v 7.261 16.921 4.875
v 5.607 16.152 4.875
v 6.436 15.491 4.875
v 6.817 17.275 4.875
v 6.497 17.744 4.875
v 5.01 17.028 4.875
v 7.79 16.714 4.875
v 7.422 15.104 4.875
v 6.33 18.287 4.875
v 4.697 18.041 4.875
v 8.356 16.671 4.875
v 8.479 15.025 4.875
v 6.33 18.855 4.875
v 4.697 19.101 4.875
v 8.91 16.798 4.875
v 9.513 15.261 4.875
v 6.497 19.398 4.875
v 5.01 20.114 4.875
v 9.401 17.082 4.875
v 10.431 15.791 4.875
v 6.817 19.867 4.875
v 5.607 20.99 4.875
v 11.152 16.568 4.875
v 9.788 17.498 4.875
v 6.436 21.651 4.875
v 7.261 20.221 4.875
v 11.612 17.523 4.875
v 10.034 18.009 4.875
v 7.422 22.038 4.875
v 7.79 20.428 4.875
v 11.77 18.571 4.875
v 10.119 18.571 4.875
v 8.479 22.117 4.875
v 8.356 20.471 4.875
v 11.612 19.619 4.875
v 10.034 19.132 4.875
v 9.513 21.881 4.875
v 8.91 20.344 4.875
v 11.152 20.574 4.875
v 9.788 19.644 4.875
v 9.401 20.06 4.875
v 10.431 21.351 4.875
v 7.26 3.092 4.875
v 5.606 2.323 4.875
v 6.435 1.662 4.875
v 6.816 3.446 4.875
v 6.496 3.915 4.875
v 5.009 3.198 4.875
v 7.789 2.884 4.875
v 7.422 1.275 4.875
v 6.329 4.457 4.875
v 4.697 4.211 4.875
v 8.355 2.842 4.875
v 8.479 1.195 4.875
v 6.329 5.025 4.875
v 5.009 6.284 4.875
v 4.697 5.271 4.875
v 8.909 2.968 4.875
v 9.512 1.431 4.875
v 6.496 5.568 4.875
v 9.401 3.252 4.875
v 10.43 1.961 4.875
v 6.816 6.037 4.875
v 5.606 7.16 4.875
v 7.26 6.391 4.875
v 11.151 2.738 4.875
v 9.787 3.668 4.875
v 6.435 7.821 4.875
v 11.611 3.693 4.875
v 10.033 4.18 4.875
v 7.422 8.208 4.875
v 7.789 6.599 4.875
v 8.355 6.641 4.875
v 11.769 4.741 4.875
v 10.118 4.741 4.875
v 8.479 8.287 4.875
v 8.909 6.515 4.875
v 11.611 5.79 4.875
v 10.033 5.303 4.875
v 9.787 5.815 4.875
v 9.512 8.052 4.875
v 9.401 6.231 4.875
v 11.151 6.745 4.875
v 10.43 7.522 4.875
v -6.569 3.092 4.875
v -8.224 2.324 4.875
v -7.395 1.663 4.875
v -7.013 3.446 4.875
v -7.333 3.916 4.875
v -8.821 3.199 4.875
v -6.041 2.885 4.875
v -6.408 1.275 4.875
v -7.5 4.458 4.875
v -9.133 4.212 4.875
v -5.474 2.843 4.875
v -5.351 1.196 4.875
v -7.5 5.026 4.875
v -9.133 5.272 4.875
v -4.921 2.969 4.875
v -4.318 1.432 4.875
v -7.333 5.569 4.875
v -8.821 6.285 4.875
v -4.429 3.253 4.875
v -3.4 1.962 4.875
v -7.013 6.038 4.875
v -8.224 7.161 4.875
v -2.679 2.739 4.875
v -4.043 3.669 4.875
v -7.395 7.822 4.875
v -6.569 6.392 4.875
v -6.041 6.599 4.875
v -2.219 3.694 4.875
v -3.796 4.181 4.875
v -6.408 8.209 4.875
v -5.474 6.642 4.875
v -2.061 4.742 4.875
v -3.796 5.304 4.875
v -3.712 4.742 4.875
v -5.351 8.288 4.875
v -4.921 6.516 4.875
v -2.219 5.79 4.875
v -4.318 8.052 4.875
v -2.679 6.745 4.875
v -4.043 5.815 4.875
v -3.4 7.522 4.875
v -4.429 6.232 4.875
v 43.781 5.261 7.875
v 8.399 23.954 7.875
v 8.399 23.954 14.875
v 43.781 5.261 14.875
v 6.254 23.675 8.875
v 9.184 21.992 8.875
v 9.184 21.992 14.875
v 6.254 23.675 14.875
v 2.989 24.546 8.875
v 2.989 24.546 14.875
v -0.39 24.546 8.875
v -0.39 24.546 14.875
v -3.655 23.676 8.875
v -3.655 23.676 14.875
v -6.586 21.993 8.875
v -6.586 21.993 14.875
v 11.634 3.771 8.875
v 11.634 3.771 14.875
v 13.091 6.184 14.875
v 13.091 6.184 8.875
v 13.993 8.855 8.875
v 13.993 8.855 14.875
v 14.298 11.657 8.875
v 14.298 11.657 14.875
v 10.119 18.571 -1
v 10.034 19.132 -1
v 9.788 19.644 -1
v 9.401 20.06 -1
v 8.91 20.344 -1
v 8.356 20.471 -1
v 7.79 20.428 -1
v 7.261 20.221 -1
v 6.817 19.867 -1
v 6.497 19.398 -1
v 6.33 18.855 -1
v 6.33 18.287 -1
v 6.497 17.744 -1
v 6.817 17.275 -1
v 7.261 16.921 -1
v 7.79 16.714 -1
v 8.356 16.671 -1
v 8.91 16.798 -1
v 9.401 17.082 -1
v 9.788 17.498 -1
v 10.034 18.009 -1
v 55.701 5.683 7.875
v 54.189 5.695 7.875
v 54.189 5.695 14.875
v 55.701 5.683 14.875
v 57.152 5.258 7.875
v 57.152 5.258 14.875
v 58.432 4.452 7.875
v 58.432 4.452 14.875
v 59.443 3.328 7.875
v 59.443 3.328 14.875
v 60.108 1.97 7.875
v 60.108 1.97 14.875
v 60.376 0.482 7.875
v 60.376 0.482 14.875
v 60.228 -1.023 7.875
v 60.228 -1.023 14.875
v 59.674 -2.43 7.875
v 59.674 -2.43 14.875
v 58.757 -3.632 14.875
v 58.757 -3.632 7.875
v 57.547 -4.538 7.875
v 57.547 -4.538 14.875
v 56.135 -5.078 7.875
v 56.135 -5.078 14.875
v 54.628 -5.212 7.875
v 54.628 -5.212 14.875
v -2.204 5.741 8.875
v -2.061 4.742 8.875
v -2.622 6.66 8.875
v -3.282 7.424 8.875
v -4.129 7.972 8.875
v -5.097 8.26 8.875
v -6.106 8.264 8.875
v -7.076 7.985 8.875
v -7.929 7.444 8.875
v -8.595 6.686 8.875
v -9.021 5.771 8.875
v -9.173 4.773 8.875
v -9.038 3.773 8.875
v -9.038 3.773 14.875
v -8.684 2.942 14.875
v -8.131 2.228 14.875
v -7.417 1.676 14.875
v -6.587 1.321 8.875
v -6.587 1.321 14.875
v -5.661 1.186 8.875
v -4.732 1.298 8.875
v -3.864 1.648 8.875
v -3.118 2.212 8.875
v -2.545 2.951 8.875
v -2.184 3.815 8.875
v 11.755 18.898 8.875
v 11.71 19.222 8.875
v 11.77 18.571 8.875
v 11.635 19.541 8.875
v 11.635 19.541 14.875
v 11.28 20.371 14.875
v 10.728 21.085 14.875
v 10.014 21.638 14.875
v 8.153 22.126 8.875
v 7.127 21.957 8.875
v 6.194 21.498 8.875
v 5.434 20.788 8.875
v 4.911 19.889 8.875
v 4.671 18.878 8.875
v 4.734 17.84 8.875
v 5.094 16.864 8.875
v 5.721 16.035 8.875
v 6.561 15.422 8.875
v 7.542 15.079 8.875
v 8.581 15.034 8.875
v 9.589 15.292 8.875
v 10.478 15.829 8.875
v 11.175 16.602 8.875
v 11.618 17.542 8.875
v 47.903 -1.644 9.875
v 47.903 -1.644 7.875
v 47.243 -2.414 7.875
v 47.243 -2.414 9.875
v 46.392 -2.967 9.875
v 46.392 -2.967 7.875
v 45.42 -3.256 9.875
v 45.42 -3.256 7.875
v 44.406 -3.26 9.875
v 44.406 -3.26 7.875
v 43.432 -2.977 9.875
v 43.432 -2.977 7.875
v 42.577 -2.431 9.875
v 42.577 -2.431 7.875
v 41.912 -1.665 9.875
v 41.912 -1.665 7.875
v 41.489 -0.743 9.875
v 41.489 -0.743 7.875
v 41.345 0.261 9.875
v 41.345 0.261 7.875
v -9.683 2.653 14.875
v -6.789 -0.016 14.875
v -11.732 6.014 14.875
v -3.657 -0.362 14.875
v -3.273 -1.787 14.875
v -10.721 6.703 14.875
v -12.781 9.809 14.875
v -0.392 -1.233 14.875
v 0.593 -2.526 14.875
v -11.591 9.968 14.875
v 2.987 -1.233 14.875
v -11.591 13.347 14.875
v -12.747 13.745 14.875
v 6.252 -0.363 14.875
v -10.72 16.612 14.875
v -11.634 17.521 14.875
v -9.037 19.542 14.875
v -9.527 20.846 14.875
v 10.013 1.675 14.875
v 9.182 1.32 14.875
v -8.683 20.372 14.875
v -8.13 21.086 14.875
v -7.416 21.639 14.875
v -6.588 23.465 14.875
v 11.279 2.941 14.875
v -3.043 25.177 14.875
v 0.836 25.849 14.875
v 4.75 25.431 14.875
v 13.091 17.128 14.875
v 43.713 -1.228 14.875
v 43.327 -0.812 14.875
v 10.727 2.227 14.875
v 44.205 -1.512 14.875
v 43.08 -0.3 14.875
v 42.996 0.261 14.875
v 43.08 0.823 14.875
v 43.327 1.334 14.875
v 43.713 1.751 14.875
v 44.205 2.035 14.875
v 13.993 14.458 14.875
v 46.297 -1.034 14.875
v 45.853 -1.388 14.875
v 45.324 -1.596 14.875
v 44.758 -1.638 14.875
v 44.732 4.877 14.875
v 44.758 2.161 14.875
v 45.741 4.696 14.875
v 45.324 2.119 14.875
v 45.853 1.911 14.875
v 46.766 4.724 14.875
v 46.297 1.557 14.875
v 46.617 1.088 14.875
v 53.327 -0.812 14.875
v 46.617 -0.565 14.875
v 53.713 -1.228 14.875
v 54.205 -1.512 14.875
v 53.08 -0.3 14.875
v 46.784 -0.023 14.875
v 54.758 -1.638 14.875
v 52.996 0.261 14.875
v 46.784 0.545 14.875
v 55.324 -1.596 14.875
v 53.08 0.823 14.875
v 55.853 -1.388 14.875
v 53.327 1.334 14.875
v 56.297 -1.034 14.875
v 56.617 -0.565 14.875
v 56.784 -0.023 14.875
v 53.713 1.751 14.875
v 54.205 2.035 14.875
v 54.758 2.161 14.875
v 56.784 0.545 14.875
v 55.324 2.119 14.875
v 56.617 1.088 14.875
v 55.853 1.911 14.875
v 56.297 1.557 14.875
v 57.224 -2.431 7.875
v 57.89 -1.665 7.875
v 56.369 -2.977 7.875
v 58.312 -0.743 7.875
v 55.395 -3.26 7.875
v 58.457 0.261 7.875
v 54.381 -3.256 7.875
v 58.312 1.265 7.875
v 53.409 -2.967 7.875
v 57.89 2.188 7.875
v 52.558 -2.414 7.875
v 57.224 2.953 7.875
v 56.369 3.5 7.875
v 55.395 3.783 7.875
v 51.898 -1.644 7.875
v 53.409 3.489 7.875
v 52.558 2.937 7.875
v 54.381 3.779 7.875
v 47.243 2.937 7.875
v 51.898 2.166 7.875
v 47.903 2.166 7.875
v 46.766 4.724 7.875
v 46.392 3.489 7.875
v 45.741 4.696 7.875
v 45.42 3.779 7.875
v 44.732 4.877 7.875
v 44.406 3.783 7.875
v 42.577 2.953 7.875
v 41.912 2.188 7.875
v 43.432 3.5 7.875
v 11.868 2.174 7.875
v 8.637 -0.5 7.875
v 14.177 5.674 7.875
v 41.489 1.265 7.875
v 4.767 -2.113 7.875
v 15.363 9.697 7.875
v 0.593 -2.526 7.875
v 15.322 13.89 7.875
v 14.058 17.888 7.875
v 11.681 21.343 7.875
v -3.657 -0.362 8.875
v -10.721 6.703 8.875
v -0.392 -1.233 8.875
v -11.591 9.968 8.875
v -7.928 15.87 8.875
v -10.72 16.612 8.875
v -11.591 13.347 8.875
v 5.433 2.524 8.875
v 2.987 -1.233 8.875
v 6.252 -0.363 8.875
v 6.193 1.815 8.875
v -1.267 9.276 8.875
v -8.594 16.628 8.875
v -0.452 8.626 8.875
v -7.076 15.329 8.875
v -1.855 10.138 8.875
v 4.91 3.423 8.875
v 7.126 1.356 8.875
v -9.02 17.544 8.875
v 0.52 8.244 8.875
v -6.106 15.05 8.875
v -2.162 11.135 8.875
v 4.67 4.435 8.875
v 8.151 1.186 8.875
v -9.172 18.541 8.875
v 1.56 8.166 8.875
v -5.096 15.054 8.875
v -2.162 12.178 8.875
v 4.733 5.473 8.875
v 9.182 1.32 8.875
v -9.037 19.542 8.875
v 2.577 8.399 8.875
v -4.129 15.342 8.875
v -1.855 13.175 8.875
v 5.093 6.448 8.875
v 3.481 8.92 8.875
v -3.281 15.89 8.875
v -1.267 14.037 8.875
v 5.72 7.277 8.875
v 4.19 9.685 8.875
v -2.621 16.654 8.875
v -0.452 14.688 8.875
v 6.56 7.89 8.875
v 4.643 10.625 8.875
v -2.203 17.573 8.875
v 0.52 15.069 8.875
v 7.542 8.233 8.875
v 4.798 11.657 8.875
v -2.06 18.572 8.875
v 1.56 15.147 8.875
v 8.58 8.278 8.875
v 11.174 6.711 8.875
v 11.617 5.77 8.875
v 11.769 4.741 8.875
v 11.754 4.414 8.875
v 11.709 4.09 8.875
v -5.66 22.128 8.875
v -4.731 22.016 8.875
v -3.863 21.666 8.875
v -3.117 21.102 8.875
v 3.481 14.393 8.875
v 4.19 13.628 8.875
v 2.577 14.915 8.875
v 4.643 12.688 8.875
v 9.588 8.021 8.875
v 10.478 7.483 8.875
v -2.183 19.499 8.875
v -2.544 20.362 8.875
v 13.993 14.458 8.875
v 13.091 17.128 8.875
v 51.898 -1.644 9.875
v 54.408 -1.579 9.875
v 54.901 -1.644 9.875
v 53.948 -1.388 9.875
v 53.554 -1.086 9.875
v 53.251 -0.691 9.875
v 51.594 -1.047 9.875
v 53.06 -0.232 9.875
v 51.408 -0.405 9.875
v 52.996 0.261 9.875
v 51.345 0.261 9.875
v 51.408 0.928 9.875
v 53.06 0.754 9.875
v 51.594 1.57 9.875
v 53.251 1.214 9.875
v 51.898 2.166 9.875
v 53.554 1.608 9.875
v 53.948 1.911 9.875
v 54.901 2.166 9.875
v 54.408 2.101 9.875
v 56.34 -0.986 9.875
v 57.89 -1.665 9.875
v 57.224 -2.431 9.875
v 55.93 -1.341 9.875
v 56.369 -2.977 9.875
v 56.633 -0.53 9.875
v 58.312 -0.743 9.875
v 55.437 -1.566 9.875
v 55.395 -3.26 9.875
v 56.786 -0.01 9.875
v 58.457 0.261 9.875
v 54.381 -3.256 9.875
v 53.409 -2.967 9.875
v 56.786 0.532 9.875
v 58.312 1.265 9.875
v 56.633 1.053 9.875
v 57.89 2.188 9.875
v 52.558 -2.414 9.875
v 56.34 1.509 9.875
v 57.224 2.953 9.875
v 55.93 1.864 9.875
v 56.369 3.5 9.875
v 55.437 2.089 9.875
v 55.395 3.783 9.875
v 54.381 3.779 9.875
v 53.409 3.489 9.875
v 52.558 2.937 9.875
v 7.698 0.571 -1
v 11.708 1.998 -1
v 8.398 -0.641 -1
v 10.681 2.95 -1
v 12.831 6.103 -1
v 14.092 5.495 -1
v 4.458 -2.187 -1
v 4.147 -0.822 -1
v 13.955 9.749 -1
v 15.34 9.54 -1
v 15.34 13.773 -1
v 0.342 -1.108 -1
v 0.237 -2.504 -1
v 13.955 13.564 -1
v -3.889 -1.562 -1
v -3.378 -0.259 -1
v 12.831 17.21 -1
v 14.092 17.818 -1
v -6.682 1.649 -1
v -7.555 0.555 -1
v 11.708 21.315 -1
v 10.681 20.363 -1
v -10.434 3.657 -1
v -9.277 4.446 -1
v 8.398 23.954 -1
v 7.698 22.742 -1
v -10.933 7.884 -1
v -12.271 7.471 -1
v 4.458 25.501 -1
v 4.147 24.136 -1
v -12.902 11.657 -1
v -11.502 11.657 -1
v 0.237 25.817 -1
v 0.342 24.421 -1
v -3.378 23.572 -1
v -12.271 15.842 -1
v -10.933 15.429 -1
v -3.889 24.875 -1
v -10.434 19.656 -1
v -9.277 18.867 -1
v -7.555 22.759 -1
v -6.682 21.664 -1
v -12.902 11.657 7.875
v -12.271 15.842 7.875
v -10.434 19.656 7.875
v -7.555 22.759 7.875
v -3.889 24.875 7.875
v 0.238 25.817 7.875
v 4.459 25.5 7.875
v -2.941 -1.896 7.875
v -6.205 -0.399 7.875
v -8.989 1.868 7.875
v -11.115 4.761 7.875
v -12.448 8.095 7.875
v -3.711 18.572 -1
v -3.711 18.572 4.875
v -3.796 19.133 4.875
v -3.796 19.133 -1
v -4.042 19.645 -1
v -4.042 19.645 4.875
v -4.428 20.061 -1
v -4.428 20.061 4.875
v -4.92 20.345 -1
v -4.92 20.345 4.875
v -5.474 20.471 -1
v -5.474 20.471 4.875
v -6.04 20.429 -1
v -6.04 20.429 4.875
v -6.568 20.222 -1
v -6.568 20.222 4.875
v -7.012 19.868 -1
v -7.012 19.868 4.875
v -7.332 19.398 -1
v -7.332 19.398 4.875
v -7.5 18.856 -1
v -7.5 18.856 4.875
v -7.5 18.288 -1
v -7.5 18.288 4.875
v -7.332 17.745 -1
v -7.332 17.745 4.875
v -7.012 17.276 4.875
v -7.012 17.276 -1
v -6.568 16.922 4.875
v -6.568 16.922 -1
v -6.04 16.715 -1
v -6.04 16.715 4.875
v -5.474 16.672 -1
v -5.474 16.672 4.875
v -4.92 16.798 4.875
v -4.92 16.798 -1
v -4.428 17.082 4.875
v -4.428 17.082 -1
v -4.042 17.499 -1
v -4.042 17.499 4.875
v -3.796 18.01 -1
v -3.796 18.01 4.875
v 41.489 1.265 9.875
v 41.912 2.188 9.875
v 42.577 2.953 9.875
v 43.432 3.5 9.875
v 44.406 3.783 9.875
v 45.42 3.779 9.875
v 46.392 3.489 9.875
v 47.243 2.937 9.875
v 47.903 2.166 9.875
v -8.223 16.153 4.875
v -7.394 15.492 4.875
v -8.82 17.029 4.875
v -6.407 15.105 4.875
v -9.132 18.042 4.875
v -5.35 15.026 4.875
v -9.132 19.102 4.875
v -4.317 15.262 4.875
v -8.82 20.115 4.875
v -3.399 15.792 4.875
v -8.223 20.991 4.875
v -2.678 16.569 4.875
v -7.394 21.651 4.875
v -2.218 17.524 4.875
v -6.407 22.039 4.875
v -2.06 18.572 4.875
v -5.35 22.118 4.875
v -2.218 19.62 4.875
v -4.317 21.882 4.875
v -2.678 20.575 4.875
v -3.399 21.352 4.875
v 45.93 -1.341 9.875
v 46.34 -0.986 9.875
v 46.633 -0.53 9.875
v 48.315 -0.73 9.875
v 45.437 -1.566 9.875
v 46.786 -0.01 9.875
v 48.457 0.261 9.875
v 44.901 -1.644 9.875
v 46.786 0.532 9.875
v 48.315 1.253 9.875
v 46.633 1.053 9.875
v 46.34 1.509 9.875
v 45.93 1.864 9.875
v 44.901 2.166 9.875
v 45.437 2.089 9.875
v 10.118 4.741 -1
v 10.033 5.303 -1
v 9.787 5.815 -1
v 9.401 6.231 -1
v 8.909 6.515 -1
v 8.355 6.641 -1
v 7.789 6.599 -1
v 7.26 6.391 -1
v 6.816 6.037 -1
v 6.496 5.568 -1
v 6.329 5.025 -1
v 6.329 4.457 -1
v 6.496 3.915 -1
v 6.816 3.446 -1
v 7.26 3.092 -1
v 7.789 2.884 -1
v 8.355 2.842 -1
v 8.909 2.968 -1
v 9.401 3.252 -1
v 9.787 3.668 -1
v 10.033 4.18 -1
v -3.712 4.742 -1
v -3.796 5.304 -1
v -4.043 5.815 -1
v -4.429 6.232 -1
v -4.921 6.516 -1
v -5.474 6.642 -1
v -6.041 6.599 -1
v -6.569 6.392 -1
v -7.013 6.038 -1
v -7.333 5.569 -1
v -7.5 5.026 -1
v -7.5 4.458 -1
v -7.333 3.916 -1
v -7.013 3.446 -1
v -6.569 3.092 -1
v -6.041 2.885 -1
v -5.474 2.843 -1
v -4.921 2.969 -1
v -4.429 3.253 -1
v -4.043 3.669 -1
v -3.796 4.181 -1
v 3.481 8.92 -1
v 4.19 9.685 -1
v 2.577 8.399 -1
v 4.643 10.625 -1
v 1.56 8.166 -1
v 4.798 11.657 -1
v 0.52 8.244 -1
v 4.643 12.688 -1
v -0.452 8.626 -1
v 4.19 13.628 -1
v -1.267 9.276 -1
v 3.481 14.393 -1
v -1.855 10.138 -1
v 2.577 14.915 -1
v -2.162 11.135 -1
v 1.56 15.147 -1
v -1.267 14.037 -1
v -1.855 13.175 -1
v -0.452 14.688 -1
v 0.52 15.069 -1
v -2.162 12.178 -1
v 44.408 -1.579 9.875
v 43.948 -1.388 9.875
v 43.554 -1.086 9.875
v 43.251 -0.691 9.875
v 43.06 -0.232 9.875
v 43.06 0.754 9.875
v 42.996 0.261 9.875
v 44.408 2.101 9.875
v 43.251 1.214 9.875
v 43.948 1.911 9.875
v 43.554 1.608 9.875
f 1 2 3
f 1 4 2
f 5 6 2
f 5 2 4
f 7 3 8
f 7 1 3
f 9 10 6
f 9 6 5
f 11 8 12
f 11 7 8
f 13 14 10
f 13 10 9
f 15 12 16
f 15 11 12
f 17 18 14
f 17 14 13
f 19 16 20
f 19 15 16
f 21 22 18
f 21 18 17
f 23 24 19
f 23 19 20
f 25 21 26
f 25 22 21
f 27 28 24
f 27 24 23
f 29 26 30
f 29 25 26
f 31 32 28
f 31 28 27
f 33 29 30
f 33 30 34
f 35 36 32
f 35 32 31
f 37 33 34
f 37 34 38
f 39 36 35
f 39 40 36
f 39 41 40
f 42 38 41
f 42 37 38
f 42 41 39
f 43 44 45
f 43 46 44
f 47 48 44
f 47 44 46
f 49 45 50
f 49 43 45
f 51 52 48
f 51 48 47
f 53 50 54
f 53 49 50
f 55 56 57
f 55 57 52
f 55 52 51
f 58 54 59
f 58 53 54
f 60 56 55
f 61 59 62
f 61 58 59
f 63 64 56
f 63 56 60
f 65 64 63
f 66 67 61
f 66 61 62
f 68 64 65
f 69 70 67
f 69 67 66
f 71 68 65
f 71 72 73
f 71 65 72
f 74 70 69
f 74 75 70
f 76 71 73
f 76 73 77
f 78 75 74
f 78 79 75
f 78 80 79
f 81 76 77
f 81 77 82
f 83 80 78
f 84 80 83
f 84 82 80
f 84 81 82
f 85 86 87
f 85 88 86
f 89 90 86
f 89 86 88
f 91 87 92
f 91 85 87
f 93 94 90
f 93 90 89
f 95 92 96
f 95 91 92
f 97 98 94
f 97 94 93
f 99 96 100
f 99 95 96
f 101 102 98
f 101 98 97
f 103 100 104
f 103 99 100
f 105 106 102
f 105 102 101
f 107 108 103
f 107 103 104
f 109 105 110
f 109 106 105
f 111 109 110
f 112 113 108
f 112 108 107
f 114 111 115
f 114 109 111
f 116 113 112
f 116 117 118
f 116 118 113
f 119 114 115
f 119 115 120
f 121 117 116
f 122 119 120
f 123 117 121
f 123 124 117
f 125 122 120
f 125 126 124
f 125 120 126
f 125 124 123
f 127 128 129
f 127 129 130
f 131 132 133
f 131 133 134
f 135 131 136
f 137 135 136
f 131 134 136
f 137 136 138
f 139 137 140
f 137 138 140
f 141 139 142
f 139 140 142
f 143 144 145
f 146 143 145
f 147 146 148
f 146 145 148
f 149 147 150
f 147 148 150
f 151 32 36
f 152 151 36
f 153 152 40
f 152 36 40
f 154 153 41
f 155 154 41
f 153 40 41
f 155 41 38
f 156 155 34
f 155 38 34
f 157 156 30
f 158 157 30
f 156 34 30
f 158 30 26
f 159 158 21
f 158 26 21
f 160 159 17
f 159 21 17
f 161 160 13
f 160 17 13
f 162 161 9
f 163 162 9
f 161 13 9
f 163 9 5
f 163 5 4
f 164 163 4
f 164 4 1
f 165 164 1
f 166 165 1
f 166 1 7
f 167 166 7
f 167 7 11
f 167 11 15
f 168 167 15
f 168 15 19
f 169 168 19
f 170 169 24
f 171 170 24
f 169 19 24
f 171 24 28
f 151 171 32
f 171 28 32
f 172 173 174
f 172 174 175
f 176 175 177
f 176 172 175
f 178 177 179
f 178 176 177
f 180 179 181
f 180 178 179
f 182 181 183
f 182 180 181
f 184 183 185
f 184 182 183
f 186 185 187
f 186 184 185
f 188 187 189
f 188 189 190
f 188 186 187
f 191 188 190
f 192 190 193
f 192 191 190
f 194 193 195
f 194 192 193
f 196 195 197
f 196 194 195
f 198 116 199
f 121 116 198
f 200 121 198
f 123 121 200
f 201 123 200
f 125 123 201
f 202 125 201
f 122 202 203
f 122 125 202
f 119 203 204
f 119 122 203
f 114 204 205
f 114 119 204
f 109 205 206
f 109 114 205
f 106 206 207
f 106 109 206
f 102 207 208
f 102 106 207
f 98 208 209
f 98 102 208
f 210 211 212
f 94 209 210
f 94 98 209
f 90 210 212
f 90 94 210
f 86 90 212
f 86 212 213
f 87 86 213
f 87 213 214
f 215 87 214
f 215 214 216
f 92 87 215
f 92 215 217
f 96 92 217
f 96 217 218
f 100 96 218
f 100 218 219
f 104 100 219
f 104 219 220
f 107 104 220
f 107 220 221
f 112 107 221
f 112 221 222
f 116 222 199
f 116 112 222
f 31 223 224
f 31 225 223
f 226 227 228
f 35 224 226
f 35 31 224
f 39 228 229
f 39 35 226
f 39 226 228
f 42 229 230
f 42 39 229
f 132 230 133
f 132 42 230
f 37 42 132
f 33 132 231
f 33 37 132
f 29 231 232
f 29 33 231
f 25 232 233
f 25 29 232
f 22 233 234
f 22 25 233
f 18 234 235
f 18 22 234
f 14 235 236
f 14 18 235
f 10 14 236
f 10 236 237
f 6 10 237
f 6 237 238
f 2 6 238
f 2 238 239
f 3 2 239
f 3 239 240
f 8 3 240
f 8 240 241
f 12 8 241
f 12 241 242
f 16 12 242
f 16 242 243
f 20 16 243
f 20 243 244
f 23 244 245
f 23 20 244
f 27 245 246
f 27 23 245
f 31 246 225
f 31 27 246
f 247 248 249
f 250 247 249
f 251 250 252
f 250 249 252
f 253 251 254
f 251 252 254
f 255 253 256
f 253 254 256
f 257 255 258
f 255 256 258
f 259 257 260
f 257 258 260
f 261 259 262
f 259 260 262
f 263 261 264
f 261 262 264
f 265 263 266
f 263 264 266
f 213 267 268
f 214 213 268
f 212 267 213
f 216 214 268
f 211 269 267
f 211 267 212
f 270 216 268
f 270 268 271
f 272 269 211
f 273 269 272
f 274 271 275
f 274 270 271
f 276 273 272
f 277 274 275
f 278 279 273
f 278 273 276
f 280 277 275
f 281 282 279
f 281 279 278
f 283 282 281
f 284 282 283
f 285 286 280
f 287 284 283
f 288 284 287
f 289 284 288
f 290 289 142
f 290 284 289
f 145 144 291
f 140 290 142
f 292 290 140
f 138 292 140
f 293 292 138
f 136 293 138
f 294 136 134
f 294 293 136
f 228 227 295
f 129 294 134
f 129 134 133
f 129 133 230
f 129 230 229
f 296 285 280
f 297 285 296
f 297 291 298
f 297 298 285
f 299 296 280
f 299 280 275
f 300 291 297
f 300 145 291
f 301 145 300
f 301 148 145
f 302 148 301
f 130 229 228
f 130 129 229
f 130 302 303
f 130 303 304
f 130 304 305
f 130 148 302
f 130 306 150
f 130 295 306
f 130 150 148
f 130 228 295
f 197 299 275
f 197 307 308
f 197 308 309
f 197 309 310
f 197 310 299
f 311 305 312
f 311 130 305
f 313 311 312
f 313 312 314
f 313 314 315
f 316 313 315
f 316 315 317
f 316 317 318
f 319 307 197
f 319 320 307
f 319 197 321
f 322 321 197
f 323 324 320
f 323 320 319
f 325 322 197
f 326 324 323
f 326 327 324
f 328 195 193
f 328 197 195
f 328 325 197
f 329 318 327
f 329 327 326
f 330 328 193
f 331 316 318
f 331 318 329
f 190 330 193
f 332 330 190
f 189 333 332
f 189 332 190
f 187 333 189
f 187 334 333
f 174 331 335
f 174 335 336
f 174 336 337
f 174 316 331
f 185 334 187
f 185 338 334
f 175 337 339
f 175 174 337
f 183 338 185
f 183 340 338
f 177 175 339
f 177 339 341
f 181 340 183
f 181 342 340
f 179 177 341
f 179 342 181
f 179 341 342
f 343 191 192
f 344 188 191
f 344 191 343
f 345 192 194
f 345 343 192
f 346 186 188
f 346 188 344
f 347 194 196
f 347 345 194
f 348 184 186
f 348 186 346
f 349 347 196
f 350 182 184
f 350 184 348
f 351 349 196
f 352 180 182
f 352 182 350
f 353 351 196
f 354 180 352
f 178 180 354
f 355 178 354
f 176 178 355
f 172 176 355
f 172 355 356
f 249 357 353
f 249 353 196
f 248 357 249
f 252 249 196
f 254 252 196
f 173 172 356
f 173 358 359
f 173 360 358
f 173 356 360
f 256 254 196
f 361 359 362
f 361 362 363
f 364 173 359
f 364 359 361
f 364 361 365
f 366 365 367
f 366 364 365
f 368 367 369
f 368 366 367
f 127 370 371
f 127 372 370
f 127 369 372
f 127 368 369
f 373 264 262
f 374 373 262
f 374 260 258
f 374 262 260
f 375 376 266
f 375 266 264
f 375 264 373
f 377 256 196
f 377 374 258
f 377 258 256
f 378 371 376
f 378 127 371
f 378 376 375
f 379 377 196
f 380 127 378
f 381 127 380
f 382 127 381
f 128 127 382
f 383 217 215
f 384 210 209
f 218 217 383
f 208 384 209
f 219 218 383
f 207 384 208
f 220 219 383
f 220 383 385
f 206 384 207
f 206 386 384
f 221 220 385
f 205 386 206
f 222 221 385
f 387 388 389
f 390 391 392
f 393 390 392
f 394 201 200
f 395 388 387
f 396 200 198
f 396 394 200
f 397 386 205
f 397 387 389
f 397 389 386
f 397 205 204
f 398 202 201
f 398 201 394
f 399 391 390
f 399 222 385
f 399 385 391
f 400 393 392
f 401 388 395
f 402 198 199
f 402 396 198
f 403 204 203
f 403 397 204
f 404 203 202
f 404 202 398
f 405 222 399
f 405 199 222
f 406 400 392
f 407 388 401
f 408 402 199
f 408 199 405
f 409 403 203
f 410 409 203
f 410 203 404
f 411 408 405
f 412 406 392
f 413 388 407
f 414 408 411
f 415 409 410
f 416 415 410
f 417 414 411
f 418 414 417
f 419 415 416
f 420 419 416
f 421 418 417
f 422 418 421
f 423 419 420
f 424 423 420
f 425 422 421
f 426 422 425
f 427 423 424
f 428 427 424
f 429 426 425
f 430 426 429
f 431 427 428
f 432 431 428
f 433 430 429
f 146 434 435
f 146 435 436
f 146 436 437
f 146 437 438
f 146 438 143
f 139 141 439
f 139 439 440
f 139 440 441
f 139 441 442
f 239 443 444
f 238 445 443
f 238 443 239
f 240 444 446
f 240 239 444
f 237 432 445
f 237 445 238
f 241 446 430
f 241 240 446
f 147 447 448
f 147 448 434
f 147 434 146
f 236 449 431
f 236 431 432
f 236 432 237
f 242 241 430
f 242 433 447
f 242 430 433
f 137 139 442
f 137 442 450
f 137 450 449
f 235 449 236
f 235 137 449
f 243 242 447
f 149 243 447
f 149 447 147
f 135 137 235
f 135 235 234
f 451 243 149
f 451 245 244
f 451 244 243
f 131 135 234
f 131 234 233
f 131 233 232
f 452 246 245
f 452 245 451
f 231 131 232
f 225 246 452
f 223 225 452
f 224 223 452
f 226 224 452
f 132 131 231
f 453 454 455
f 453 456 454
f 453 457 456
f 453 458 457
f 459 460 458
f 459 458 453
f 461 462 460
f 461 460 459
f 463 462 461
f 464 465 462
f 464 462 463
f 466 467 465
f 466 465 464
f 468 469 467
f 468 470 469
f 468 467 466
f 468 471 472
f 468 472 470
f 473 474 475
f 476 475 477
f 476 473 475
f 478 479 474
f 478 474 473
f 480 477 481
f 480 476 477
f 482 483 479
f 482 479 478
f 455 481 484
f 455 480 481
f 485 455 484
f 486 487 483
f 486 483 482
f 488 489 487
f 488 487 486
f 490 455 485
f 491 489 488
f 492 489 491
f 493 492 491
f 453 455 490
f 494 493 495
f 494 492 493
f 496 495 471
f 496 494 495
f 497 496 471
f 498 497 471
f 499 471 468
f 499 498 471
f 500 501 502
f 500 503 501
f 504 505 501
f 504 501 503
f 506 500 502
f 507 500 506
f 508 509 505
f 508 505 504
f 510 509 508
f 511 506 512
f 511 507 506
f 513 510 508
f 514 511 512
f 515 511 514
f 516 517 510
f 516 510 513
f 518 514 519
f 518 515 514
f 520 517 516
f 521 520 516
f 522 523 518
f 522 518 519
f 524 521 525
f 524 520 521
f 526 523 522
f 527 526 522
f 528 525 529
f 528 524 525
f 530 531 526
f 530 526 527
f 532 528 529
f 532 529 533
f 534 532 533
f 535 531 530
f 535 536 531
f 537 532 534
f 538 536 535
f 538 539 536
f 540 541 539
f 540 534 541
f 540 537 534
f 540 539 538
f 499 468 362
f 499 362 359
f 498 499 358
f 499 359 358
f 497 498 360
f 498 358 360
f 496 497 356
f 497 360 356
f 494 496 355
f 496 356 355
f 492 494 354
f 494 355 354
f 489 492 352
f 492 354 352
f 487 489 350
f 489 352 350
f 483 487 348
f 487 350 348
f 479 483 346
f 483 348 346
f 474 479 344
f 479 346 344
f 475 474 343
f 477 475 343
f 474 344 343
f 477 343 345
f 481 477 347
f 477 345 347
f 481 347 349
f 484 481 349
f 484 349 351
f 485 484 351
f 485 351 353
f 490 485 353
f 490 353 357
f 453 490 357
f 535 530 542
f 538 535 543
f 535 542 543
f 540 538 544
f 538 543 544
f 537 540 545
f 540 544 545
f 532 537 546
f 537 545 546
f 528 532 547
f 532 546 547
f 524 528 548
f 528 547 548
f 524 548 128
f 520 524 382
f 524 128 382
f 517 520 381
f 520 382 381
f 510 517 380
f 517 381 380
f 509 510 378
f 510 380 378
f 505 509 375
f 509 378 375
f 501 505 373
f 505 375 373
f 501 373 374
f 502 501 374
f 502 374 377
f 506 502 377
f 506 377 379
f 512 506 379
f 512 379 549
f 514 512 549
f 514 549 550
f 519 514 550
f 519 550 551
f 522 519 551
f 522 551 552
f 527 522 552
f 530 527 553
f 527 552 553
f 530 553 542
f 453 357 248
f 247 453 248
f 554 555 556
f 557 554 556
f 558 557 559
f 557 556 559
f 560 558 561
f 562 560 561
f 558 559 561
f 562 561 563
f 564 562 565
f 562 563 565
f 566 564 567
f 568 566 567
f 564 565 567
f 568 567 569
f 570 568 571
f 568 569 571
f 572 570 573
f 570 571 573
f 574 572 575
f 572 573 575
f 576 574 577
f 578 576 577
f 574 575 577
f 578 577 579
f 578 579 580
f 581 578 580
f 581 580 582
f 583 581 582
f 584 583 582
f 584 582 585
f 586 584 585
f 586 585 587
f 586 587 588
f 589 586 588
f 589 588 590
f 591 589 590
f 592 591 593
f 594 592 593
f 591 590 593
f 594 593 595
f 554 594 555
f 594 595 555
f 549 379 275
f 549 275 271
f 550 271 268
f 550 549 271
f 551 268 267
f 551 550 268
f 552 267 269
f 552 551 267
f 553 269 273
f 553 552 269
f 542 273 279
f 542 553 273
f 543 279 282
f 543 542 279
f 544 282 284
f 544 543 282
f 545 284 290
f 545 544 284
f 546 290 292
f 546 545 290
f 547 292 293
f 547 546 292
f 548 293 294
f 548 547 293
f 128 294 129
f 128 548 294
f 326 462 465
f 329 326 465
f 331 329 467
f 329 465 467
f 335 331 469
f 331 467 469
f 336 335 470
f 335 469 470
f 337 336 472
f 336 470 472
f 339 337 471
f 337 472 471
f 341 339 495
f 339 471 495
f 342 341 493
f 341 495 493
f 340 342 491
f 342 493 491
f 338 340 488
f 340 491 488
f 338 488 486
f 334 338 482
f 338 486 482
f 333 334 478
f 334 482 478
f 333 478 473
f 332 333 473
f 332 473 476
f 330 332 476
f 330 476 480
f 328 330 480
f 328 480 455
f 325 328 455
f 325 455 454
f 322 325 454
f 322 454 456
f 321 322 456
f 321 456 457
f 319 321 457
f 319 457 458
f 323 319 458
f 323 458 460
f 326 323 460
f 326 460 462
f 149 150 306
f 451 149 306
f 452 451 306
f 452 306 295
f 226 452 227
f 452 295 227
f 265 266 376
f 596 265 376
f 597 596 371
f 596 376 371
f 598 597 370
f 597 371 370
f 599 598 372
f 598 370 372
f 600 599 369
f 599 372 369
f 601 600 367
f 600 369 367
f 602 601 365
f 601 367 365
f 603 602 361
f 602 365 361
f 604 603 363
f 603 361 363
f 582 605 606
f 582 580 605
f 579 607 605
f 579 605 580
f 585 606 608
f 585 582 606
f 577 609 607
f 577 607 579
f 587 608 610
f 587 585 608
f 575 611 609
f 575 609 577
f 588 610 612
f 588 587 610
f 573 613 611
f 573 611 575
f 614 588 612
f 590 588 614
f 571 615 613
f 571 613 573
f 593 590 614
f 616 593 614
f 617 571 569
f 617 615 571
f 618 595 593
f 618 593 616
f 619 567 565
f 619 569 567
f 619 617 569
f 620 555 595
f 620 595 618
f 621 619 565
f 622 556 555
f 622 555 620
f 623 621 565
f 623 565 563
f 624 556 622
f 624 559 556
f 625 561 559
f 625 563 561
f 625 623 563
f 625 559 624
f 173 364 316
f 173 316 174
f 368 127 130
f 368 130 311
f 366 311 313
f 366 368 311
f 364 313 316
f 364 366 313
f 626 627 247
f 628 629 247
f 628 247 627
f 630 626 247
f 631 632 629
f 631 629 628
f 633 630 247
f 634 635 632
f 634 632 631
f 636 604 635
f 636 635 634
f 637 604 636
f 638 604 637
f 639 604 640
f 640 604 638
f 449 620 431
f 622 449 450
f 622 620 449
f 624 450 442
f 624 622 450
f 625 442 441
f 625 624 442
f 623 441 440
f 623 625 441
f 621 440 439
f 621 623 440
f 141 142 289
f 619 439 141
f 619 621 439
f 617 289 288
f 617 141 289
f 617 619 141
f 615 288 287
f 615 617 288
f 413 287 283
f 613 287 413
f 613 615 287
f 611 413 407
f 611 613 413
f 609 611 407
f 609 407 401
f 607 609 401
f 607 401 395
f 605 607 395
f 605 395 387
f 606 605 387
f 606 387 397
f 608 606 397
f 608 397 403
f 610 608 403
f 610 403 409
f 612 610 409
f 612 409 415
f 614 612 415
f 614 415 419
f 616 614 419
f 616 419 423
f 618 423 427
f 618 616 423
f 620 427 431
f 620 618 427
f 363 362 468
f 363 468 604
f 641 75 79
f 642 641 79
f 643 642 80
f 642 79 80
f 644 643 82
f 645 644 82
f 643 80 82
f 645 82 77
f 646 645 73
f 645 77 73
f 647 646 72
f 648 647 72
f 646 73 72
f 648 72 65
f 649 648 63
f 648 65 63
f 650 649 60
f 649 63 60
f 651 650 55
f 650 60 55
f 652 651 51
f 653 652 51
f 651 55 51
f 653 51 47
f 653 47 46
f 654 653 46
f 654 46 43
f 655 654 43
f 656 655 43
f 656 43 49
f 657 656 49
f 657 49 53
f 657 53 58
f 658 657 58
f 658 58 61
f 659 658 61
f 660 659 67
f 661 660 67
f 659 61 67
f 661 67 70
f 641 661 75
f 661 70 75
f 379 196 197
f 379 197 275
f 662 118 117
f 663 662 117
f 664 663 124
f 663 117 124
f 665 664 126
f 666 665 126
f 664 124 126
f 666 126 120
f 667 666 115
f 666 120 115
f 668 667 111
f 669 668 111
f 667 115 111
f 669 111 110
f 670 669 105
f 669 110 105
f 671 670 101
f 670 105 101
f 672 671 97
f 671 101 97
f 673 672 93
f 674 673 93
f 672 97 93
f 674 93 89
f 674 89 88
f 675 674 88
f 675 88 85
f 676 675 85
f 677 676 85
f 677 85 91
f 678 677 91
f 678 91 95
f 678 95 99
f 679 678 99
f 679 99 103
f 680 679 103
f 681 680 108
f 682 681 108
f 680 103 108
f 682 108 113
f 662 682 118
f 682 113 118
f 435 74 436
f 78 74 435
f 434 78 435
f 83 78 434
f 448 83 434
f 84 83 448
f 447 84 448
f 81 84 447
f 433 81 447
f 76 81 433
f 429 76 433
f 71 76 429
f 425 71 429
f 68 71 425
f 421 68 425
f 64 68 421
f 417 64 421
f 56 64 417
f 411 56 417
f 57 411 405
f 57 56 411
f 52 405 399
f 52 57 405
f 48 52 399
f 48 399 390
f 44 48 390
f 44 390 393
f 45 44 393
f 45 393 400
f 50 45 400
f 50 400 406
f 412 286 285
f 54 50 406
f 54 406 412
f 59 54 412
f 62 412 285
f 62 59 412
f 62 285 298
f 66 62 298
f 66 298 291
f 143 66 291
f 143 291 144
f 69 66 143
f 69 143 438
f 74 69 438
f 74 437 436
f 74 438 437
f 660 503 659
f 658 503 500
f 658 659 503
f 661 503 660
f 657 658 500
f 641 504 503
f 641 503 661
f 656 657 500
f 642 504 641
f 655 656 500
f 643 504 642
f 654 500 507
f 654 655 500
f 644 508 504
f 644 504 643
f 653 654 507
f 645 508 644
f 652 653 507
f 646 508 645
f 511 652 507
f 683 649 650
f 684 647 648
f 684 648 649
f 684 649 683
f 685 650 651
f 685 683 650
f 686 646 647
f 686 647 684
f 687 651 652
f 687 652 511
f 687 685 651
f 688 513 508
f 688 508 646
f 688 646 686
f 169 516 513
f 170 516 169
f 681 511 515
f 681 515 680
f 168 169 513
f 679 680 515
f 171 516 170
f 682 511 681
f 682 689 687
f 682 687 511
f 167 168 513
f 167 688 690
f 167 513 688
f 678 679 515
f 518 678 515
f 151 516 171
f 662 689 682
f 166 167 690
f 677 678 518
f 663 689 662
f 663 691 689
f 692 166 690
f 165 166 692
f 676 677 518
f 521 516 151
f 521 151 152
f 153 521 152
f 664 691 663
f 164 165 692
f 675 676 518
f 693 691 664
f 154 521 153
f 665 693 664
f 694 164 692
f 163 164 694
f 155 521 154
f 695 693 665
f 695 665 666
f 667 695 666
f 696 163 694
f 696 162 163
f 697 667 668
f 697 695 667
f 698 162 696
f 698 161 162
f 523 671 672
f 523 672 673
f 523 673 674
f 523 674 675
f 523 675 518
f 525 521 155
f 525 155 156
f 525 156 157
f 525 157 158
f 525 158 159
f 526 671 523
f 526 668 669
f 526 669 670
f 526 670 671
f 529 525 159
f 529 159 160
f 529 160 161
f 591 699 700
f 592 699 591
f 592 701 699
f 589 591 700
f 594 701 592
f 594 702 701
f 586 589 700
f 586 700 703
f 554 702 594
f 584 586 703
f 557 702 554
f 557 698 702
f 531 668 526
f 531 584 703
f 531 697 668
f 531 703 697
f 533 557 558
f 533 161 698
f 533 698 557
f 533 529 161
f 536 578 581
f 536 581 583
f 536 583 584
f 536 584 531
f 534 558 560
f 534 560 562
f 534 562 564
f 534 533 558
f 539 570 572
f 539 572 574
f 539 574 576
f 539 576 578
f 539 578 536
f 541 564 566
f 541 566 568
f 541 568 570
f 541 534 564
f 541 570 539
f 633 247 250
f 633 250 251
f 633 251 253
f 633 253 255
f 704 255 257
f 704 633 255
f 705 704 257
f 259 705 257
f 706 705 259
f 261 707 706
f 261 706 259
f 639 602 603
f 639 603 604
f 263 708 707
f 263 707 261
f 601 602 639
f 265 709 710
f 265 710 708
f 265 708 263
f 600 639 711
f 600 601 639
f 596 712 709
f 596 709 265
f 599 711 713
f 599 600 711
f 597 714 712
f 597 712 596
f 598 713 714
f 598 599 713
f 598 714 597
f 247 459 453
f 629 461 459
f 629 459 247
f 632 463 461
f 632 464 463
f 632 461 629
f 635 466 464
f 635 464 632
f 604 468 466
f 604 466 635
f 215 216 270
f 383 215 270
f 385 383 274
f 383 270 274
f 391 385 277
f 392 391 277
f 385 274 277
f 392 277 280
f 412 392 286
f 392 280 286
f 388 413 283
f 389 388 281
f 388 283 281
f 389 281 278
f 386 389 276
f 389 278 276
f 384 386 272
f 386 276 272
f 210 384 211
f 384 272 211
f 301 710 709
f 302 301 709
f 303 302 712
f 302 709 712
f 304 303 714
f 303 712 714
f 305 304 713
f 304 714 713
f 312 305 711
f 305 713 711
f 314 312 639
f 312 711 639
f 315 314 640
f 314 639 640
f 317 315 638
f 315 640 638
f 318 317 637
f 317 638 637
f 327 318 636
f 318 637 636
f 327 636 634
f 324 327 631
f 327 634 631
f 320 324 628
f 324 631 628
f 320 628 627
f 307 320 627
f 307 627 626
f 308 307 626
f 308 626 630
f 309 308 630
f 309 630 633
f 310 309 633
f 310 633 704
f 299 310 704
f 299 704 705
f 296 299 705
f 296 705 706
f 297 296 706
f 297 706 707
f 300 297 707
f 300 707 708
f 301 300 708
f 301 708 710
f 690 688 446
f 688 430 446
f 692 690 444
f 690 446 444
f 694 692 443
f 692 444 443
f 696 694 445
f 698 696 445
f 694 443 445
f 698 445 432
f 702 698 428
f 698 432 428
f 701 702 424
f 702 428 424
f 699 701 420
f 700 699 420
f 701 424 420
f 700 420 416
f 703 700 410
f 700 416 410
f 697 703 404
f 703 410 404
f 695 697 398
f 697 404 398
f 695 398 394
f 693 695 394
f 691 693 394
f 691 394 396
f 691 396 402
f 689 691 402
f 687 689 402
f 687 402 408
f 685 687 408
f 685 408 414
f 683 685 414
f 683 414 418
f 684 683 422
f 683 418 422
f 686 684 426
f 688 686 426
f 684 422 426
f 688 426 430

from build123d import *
from build123d.topology import SkipClean

# Parameters (mm, degrees)
BOSS_EXTRUDE1_DEPTH                     = 15
CBORE_FOR_M6_HEX_HEAD_BOLT1_D           = 7
CBORE_FOR_M6_HEX_HEAD_BOLT1_CBORE_D     = 25.6
CBORE_FOR_M6_HEX_HEAD_BOLT1_CBORE_DEPTH = 3
SKETCH30_W                              = 87.8922038
SKETCH30_H                              = 63.386693804
CUT_EXTRUDE8_DEPTH                      = 0.125
SKETCH31_W                              = 82.344977649
SKETCH31_H                              = 39.024548637
CUT_EXTRUDE9_DEPTH                      = 0.125
SKETCH38_R                              = 1.905
CUT_EXTRUDE10_DEPTH                     = 68.319909946
SKETCH39_OUTSIDE_W                      = 91.473
SKETCH39_OUTSIDE_H                      = 49.266
SKETCH39_OUTSIDE_R                      = 12.8
CUT_EXTRUDE11_DEPTH                     = 7.75
SKETCH40_R                              = 13
CUT_EXTRUDE12_DEPTH                     = 6
BOSS_EXTRUDE2_START                     = 4
SKETCH41_R                              = 12.8
BOSS_EXTRUDE2_DEPTH                     = 4
SKETCH42_R                              = 3.5
SKETCH42_R_2                            = 1.905
CUT_EXTRUDE13_DEPTH                     = 67.748958045
SKETCH43_R                              = 14.2
SKETCH43_R_2                            = 12.8
BOSS_EXTRUDE3_DEPTH                     = 8.875
CUT_EXTRUDE14_DEPTH                     = 67.422311011
CUT_EXTRUDE14_DEPTH_BACK                = 4
SKETCH44_R                              = 3.556
SKETCH45_R                              = 1.905
CUT_EXTRUDE15_DEPTH                     = 67.2810184
SKETCH46_R                              = 3.556
CUT_EXTRUDE16_DEPTH                     = 2
SKETCH47_W                              = 10
SKETCH47_H                              = 3.81
CUT_EXTRUDE17_DEPTH                     = 2


with BuildPart() as part:
    # Sketch1 → Boss-Extrude1 (new body)
    with BuildSketch(Plane(origin=(0, 0, 0), x_dir=(-1, 0, 0), z_dir=(0, 0, -1))):
        with BuildLine():
            Line((-54.628463331, -5.212133486), (-0.593380164, -2.525889334))
            ThreePointArc((-0.593380164, -2.525889334), (12.32206912, 15.671805741), (-8.399323253, 23.953643362))
            Line((-8.399323253, 23.953643362), (-43.781031906, 5.260553383))
            ThreePointArc((-43.781031906, 5.260553383), (-45.231601083, 4.760443022), (-46.765522471, 4.723748524))
            Line((-46.765522471, 4.723748524), (-54.189447973, 5.695292216))
            ThreePointArc((-54.189447973, 5.695292216), (-60.376392814, 0.481764046), (-54.628463331, -5.212133486))
        make_face()
    extrude(amount=-BOSS_EXTRUDE1_DEPTH)

    # CBORE for M6 Hex Head Bolt1 (through all)
    with Locations(Plane(origin=(0, 0, 0), x_dir=(-1, 0, 0), z_dir=(0, 0, -1))):
        with Locations((-1.298433566, 11.656596333)):
            CounterBoreHole(CBORE_FOR_M6_HEX_HEAD_BOLT1_D / 2, CBORE_FOR_M6_HEX_HEAD_BOLT1_CBORE_D / 2, CBORE_FOR_M6_HEX_HEAD_BOLT1_CBORE_DEPTH)

    # Sketch30 → Cut-Extrude8 (cut)
    with BuildSketch(Plane.XY.offset(15)):
        with Locations((24.760370948, 9.451685766)):
            Rectangle(SKETCH30_W, SKETCH30_H)
    extrude(amount=-CUT_EXTRUDE8_DEPTH, mode=Mode.SUBTRACT)

    # Sketch31 → Cut-Extrude9 (cut)
    with BuildSketch(Plane(origin=(0, 0, 0), x_dir=(-1, 0, 0), z_dir=(0, 0, -1))):
        with Locations((-23.438477607, 10.614160855)):
            Rectangle(SKETCH31_W, SKETCH31_H)
    extrude(amount=-CUT_EXTRUDE9_DEPTH, mode=Mode.SUBTRACT)

    # Sketch38 → Cut-Extrude10 (cut, through all)
    with BuildSketch(Plane.XY.offset(14.875)):
        with Locations((-5.615950455, 18.571806714)):
            Circle(SKETCH38_R)
        with Locations((8.213643947, 18.570980353)):
            Circle(SKETCH38_R)
        with Locations((8.212817586, 4.741385951)):
            Circle(SKETCH38_R)
        with Locations((-5.616776816, 4.742212313)):
            Circle(SKETCH38_R)
    extrude(amount=-CUT_EXTRUDE10_DEPTH, mode=Mode.SUBTRACT)

    # Sketch39 outside → Cut-Extrude11 (cut)
    with BuildSketch(Plane(origin=(0, 0, 0.125), x_dir=(-1, 0, 0), z_dir=(0, 0, -1))):
        with Locations((-23.7395, 10.319)):
            Rectangle(SKETCH39_OUTSIDE_W, SKETCH39_OUTSIDE_H)
        with Locations(Location((-1.298433566, 11.656596333, 0), (0, 0, 180))):
            Circle(SKETCH39_OUTSIDE_R, mode=Mode.SUBTRACT)
    extrude(amount=-CUT_EXTRUDE11_DEPTH, mode=Mode.SUBTRACT)

    # Sketch40 → Cut-Extrude12 (cut)
    with BuildSketch(Plane.XY.offset(14.875)):
        with Locations((1.298433566, 11.656596333)):
            Circle(SKETCH40_R)
    extrude(amount=-CUT_EXTRUDE12_DEPTH, mode=Mode.SUBTRACT)

    # Sketch41 → Boss-Extrude2 (add)
    with BuildSketch(Plane(origin=(0, 0, 3), x_dir=(-1, 0, 0), z_dir=(0, 0, -1)).offset(BOSS_EXTRUDE2_START)):
        with Locations((-1.298433566, 11.656596333)):
            Circle(SKETCH41_R)
    extrude(amount=-BOSS_EXTRUDE2_DEPTH)

    # Sketch42 → Cut-Extrude13 (cut, through all)
    with BuildSketch(Plane.XY.offset(3)):
        with Locations((1.298433566, 11.656596333)):
            Circle(SKETCH42_R)
        with Locations((8.212817586, 4.741385951)):
            Circle(SKETCH42_R_2)
        with Locations((-5.616776816, 4.742212313)):
            Circle(SKETCH42_R_2)
        with Locations((-5.615950455, 18.571806714)):
            Circle(SKETCH42_R_2)
        with Locations((8.213643947, 18.570980353)):
            Circle(SKETCH42_R_2)
    extrude(amount=-CUT_EXTRUDE13_DEPTH, mode=Mode.SUBTRACT)

    # Sketch43 → Boss-Extrude3 (add, through all)
    with SkipClean():  # the faces are left unmerged after this step: merging them gives an invalid solid
        with BuildSketch(Plane(origin=(0, 0, 7.875), x_dir=(-1, 0, 0), z_dir=(0, 0, -1))):
            with Locations((-1.298433566, 11.656596333)):
                Circle(SKETCH43_R)
            with Locations((-1.298433566, 11.656596333)):
                Circle(SKETCH43_R_2, mode=Mode.SUBTRACT)
        extrude(amount=BOSS_EXTRUDE3_DEPTH)

    # Sketch44 → Cut-Extrude14 (cut, two sides: drawn at the far end of the back side and taken through both)
    with SkipClean():  # the faces are left unmerged after this step: merging them gives an invalid solid
        with BuildSketch(Plane.XY.offset(8.875).offset(-CUT_EXTRUDE14_DEPTH_BACK)):
            with Locations((8.213643947, 18.570980353)):
                Circle(SKETCH44_R)
            with Locations((-5.615950455, 18.571806714)):
                Circle(SKETCH44_R)
            with Locations((-5.616776816, 4.742212313)):
                Circle(SKETCH44_R)
            with Locations((8.212817586, 4.741385951)):
                Circle(SKETCH44_R)
        extrude(amount=CUT_EXTRUDE14_DEPTH + CUT_EXTRUDE14_DEPTH_BACK, mode=Mode.SUBTRACT)

    # Sketch45 → Cut-Extrude15 (cut, through all)
    with SkipClean():  # the faces are left unmerged after this step: merging them gives an invalid solid
        with BuildSketch(Plane(origin=(0, 0, 7.875), x_dir=(-1, 0, 0), z_dir=(0, 0, -1))):
            with Locations((-54.900567232, 0.261366347)):
                Circle(SKETCH45_R)
            with Locations((-44.900567232, 0.261366347)):
                Circle(SKETCH45_R)
        extrude(amount=-CUT_EXTRUDE15_DEPTH, mode=Mode.SUBTRACT)

    # Sketch46 → Cut-Extrude16 (cut)
    with SkipClean():  # the faces are left unmerged after this step: merging them gives an invalid solid
        with BuildSketch(Plane(origin=(0, 0, 7.875), x_dir=(-1, 0, 0), z_dir=(0, 0, -1))):
            with Locations((-54.900567232, 0.261366347)):
                Circle(SKETCH46_R)
            with Locations((-44.900567232, 0.261366347)):
                Circle(SKETCH46_R)
        extrude(amount=-CUT_EXTRUDE16_DEPTH, mode=Mode.SUBTRACT)

    # Sketch47 → Cut-Extrude17 (cut)
    with SkipClean():  # the faces are left unmerged after this step: merging them gives an invalid solid
        with BuildSketch(Plane(origin=(0, 0, 7.875), x_dir=(-1, 0, 0), z_dir=(0, 0, -1))):
            with Locations((-49.900567232, 0.261366347)):
                Rectangle(SKETCH47_W, SKETCH47_H)
        extrude(amount=-CUT_EXTRUDE17_DEPTH, mode=Mode.SUBTRACT)


solid = part.part
